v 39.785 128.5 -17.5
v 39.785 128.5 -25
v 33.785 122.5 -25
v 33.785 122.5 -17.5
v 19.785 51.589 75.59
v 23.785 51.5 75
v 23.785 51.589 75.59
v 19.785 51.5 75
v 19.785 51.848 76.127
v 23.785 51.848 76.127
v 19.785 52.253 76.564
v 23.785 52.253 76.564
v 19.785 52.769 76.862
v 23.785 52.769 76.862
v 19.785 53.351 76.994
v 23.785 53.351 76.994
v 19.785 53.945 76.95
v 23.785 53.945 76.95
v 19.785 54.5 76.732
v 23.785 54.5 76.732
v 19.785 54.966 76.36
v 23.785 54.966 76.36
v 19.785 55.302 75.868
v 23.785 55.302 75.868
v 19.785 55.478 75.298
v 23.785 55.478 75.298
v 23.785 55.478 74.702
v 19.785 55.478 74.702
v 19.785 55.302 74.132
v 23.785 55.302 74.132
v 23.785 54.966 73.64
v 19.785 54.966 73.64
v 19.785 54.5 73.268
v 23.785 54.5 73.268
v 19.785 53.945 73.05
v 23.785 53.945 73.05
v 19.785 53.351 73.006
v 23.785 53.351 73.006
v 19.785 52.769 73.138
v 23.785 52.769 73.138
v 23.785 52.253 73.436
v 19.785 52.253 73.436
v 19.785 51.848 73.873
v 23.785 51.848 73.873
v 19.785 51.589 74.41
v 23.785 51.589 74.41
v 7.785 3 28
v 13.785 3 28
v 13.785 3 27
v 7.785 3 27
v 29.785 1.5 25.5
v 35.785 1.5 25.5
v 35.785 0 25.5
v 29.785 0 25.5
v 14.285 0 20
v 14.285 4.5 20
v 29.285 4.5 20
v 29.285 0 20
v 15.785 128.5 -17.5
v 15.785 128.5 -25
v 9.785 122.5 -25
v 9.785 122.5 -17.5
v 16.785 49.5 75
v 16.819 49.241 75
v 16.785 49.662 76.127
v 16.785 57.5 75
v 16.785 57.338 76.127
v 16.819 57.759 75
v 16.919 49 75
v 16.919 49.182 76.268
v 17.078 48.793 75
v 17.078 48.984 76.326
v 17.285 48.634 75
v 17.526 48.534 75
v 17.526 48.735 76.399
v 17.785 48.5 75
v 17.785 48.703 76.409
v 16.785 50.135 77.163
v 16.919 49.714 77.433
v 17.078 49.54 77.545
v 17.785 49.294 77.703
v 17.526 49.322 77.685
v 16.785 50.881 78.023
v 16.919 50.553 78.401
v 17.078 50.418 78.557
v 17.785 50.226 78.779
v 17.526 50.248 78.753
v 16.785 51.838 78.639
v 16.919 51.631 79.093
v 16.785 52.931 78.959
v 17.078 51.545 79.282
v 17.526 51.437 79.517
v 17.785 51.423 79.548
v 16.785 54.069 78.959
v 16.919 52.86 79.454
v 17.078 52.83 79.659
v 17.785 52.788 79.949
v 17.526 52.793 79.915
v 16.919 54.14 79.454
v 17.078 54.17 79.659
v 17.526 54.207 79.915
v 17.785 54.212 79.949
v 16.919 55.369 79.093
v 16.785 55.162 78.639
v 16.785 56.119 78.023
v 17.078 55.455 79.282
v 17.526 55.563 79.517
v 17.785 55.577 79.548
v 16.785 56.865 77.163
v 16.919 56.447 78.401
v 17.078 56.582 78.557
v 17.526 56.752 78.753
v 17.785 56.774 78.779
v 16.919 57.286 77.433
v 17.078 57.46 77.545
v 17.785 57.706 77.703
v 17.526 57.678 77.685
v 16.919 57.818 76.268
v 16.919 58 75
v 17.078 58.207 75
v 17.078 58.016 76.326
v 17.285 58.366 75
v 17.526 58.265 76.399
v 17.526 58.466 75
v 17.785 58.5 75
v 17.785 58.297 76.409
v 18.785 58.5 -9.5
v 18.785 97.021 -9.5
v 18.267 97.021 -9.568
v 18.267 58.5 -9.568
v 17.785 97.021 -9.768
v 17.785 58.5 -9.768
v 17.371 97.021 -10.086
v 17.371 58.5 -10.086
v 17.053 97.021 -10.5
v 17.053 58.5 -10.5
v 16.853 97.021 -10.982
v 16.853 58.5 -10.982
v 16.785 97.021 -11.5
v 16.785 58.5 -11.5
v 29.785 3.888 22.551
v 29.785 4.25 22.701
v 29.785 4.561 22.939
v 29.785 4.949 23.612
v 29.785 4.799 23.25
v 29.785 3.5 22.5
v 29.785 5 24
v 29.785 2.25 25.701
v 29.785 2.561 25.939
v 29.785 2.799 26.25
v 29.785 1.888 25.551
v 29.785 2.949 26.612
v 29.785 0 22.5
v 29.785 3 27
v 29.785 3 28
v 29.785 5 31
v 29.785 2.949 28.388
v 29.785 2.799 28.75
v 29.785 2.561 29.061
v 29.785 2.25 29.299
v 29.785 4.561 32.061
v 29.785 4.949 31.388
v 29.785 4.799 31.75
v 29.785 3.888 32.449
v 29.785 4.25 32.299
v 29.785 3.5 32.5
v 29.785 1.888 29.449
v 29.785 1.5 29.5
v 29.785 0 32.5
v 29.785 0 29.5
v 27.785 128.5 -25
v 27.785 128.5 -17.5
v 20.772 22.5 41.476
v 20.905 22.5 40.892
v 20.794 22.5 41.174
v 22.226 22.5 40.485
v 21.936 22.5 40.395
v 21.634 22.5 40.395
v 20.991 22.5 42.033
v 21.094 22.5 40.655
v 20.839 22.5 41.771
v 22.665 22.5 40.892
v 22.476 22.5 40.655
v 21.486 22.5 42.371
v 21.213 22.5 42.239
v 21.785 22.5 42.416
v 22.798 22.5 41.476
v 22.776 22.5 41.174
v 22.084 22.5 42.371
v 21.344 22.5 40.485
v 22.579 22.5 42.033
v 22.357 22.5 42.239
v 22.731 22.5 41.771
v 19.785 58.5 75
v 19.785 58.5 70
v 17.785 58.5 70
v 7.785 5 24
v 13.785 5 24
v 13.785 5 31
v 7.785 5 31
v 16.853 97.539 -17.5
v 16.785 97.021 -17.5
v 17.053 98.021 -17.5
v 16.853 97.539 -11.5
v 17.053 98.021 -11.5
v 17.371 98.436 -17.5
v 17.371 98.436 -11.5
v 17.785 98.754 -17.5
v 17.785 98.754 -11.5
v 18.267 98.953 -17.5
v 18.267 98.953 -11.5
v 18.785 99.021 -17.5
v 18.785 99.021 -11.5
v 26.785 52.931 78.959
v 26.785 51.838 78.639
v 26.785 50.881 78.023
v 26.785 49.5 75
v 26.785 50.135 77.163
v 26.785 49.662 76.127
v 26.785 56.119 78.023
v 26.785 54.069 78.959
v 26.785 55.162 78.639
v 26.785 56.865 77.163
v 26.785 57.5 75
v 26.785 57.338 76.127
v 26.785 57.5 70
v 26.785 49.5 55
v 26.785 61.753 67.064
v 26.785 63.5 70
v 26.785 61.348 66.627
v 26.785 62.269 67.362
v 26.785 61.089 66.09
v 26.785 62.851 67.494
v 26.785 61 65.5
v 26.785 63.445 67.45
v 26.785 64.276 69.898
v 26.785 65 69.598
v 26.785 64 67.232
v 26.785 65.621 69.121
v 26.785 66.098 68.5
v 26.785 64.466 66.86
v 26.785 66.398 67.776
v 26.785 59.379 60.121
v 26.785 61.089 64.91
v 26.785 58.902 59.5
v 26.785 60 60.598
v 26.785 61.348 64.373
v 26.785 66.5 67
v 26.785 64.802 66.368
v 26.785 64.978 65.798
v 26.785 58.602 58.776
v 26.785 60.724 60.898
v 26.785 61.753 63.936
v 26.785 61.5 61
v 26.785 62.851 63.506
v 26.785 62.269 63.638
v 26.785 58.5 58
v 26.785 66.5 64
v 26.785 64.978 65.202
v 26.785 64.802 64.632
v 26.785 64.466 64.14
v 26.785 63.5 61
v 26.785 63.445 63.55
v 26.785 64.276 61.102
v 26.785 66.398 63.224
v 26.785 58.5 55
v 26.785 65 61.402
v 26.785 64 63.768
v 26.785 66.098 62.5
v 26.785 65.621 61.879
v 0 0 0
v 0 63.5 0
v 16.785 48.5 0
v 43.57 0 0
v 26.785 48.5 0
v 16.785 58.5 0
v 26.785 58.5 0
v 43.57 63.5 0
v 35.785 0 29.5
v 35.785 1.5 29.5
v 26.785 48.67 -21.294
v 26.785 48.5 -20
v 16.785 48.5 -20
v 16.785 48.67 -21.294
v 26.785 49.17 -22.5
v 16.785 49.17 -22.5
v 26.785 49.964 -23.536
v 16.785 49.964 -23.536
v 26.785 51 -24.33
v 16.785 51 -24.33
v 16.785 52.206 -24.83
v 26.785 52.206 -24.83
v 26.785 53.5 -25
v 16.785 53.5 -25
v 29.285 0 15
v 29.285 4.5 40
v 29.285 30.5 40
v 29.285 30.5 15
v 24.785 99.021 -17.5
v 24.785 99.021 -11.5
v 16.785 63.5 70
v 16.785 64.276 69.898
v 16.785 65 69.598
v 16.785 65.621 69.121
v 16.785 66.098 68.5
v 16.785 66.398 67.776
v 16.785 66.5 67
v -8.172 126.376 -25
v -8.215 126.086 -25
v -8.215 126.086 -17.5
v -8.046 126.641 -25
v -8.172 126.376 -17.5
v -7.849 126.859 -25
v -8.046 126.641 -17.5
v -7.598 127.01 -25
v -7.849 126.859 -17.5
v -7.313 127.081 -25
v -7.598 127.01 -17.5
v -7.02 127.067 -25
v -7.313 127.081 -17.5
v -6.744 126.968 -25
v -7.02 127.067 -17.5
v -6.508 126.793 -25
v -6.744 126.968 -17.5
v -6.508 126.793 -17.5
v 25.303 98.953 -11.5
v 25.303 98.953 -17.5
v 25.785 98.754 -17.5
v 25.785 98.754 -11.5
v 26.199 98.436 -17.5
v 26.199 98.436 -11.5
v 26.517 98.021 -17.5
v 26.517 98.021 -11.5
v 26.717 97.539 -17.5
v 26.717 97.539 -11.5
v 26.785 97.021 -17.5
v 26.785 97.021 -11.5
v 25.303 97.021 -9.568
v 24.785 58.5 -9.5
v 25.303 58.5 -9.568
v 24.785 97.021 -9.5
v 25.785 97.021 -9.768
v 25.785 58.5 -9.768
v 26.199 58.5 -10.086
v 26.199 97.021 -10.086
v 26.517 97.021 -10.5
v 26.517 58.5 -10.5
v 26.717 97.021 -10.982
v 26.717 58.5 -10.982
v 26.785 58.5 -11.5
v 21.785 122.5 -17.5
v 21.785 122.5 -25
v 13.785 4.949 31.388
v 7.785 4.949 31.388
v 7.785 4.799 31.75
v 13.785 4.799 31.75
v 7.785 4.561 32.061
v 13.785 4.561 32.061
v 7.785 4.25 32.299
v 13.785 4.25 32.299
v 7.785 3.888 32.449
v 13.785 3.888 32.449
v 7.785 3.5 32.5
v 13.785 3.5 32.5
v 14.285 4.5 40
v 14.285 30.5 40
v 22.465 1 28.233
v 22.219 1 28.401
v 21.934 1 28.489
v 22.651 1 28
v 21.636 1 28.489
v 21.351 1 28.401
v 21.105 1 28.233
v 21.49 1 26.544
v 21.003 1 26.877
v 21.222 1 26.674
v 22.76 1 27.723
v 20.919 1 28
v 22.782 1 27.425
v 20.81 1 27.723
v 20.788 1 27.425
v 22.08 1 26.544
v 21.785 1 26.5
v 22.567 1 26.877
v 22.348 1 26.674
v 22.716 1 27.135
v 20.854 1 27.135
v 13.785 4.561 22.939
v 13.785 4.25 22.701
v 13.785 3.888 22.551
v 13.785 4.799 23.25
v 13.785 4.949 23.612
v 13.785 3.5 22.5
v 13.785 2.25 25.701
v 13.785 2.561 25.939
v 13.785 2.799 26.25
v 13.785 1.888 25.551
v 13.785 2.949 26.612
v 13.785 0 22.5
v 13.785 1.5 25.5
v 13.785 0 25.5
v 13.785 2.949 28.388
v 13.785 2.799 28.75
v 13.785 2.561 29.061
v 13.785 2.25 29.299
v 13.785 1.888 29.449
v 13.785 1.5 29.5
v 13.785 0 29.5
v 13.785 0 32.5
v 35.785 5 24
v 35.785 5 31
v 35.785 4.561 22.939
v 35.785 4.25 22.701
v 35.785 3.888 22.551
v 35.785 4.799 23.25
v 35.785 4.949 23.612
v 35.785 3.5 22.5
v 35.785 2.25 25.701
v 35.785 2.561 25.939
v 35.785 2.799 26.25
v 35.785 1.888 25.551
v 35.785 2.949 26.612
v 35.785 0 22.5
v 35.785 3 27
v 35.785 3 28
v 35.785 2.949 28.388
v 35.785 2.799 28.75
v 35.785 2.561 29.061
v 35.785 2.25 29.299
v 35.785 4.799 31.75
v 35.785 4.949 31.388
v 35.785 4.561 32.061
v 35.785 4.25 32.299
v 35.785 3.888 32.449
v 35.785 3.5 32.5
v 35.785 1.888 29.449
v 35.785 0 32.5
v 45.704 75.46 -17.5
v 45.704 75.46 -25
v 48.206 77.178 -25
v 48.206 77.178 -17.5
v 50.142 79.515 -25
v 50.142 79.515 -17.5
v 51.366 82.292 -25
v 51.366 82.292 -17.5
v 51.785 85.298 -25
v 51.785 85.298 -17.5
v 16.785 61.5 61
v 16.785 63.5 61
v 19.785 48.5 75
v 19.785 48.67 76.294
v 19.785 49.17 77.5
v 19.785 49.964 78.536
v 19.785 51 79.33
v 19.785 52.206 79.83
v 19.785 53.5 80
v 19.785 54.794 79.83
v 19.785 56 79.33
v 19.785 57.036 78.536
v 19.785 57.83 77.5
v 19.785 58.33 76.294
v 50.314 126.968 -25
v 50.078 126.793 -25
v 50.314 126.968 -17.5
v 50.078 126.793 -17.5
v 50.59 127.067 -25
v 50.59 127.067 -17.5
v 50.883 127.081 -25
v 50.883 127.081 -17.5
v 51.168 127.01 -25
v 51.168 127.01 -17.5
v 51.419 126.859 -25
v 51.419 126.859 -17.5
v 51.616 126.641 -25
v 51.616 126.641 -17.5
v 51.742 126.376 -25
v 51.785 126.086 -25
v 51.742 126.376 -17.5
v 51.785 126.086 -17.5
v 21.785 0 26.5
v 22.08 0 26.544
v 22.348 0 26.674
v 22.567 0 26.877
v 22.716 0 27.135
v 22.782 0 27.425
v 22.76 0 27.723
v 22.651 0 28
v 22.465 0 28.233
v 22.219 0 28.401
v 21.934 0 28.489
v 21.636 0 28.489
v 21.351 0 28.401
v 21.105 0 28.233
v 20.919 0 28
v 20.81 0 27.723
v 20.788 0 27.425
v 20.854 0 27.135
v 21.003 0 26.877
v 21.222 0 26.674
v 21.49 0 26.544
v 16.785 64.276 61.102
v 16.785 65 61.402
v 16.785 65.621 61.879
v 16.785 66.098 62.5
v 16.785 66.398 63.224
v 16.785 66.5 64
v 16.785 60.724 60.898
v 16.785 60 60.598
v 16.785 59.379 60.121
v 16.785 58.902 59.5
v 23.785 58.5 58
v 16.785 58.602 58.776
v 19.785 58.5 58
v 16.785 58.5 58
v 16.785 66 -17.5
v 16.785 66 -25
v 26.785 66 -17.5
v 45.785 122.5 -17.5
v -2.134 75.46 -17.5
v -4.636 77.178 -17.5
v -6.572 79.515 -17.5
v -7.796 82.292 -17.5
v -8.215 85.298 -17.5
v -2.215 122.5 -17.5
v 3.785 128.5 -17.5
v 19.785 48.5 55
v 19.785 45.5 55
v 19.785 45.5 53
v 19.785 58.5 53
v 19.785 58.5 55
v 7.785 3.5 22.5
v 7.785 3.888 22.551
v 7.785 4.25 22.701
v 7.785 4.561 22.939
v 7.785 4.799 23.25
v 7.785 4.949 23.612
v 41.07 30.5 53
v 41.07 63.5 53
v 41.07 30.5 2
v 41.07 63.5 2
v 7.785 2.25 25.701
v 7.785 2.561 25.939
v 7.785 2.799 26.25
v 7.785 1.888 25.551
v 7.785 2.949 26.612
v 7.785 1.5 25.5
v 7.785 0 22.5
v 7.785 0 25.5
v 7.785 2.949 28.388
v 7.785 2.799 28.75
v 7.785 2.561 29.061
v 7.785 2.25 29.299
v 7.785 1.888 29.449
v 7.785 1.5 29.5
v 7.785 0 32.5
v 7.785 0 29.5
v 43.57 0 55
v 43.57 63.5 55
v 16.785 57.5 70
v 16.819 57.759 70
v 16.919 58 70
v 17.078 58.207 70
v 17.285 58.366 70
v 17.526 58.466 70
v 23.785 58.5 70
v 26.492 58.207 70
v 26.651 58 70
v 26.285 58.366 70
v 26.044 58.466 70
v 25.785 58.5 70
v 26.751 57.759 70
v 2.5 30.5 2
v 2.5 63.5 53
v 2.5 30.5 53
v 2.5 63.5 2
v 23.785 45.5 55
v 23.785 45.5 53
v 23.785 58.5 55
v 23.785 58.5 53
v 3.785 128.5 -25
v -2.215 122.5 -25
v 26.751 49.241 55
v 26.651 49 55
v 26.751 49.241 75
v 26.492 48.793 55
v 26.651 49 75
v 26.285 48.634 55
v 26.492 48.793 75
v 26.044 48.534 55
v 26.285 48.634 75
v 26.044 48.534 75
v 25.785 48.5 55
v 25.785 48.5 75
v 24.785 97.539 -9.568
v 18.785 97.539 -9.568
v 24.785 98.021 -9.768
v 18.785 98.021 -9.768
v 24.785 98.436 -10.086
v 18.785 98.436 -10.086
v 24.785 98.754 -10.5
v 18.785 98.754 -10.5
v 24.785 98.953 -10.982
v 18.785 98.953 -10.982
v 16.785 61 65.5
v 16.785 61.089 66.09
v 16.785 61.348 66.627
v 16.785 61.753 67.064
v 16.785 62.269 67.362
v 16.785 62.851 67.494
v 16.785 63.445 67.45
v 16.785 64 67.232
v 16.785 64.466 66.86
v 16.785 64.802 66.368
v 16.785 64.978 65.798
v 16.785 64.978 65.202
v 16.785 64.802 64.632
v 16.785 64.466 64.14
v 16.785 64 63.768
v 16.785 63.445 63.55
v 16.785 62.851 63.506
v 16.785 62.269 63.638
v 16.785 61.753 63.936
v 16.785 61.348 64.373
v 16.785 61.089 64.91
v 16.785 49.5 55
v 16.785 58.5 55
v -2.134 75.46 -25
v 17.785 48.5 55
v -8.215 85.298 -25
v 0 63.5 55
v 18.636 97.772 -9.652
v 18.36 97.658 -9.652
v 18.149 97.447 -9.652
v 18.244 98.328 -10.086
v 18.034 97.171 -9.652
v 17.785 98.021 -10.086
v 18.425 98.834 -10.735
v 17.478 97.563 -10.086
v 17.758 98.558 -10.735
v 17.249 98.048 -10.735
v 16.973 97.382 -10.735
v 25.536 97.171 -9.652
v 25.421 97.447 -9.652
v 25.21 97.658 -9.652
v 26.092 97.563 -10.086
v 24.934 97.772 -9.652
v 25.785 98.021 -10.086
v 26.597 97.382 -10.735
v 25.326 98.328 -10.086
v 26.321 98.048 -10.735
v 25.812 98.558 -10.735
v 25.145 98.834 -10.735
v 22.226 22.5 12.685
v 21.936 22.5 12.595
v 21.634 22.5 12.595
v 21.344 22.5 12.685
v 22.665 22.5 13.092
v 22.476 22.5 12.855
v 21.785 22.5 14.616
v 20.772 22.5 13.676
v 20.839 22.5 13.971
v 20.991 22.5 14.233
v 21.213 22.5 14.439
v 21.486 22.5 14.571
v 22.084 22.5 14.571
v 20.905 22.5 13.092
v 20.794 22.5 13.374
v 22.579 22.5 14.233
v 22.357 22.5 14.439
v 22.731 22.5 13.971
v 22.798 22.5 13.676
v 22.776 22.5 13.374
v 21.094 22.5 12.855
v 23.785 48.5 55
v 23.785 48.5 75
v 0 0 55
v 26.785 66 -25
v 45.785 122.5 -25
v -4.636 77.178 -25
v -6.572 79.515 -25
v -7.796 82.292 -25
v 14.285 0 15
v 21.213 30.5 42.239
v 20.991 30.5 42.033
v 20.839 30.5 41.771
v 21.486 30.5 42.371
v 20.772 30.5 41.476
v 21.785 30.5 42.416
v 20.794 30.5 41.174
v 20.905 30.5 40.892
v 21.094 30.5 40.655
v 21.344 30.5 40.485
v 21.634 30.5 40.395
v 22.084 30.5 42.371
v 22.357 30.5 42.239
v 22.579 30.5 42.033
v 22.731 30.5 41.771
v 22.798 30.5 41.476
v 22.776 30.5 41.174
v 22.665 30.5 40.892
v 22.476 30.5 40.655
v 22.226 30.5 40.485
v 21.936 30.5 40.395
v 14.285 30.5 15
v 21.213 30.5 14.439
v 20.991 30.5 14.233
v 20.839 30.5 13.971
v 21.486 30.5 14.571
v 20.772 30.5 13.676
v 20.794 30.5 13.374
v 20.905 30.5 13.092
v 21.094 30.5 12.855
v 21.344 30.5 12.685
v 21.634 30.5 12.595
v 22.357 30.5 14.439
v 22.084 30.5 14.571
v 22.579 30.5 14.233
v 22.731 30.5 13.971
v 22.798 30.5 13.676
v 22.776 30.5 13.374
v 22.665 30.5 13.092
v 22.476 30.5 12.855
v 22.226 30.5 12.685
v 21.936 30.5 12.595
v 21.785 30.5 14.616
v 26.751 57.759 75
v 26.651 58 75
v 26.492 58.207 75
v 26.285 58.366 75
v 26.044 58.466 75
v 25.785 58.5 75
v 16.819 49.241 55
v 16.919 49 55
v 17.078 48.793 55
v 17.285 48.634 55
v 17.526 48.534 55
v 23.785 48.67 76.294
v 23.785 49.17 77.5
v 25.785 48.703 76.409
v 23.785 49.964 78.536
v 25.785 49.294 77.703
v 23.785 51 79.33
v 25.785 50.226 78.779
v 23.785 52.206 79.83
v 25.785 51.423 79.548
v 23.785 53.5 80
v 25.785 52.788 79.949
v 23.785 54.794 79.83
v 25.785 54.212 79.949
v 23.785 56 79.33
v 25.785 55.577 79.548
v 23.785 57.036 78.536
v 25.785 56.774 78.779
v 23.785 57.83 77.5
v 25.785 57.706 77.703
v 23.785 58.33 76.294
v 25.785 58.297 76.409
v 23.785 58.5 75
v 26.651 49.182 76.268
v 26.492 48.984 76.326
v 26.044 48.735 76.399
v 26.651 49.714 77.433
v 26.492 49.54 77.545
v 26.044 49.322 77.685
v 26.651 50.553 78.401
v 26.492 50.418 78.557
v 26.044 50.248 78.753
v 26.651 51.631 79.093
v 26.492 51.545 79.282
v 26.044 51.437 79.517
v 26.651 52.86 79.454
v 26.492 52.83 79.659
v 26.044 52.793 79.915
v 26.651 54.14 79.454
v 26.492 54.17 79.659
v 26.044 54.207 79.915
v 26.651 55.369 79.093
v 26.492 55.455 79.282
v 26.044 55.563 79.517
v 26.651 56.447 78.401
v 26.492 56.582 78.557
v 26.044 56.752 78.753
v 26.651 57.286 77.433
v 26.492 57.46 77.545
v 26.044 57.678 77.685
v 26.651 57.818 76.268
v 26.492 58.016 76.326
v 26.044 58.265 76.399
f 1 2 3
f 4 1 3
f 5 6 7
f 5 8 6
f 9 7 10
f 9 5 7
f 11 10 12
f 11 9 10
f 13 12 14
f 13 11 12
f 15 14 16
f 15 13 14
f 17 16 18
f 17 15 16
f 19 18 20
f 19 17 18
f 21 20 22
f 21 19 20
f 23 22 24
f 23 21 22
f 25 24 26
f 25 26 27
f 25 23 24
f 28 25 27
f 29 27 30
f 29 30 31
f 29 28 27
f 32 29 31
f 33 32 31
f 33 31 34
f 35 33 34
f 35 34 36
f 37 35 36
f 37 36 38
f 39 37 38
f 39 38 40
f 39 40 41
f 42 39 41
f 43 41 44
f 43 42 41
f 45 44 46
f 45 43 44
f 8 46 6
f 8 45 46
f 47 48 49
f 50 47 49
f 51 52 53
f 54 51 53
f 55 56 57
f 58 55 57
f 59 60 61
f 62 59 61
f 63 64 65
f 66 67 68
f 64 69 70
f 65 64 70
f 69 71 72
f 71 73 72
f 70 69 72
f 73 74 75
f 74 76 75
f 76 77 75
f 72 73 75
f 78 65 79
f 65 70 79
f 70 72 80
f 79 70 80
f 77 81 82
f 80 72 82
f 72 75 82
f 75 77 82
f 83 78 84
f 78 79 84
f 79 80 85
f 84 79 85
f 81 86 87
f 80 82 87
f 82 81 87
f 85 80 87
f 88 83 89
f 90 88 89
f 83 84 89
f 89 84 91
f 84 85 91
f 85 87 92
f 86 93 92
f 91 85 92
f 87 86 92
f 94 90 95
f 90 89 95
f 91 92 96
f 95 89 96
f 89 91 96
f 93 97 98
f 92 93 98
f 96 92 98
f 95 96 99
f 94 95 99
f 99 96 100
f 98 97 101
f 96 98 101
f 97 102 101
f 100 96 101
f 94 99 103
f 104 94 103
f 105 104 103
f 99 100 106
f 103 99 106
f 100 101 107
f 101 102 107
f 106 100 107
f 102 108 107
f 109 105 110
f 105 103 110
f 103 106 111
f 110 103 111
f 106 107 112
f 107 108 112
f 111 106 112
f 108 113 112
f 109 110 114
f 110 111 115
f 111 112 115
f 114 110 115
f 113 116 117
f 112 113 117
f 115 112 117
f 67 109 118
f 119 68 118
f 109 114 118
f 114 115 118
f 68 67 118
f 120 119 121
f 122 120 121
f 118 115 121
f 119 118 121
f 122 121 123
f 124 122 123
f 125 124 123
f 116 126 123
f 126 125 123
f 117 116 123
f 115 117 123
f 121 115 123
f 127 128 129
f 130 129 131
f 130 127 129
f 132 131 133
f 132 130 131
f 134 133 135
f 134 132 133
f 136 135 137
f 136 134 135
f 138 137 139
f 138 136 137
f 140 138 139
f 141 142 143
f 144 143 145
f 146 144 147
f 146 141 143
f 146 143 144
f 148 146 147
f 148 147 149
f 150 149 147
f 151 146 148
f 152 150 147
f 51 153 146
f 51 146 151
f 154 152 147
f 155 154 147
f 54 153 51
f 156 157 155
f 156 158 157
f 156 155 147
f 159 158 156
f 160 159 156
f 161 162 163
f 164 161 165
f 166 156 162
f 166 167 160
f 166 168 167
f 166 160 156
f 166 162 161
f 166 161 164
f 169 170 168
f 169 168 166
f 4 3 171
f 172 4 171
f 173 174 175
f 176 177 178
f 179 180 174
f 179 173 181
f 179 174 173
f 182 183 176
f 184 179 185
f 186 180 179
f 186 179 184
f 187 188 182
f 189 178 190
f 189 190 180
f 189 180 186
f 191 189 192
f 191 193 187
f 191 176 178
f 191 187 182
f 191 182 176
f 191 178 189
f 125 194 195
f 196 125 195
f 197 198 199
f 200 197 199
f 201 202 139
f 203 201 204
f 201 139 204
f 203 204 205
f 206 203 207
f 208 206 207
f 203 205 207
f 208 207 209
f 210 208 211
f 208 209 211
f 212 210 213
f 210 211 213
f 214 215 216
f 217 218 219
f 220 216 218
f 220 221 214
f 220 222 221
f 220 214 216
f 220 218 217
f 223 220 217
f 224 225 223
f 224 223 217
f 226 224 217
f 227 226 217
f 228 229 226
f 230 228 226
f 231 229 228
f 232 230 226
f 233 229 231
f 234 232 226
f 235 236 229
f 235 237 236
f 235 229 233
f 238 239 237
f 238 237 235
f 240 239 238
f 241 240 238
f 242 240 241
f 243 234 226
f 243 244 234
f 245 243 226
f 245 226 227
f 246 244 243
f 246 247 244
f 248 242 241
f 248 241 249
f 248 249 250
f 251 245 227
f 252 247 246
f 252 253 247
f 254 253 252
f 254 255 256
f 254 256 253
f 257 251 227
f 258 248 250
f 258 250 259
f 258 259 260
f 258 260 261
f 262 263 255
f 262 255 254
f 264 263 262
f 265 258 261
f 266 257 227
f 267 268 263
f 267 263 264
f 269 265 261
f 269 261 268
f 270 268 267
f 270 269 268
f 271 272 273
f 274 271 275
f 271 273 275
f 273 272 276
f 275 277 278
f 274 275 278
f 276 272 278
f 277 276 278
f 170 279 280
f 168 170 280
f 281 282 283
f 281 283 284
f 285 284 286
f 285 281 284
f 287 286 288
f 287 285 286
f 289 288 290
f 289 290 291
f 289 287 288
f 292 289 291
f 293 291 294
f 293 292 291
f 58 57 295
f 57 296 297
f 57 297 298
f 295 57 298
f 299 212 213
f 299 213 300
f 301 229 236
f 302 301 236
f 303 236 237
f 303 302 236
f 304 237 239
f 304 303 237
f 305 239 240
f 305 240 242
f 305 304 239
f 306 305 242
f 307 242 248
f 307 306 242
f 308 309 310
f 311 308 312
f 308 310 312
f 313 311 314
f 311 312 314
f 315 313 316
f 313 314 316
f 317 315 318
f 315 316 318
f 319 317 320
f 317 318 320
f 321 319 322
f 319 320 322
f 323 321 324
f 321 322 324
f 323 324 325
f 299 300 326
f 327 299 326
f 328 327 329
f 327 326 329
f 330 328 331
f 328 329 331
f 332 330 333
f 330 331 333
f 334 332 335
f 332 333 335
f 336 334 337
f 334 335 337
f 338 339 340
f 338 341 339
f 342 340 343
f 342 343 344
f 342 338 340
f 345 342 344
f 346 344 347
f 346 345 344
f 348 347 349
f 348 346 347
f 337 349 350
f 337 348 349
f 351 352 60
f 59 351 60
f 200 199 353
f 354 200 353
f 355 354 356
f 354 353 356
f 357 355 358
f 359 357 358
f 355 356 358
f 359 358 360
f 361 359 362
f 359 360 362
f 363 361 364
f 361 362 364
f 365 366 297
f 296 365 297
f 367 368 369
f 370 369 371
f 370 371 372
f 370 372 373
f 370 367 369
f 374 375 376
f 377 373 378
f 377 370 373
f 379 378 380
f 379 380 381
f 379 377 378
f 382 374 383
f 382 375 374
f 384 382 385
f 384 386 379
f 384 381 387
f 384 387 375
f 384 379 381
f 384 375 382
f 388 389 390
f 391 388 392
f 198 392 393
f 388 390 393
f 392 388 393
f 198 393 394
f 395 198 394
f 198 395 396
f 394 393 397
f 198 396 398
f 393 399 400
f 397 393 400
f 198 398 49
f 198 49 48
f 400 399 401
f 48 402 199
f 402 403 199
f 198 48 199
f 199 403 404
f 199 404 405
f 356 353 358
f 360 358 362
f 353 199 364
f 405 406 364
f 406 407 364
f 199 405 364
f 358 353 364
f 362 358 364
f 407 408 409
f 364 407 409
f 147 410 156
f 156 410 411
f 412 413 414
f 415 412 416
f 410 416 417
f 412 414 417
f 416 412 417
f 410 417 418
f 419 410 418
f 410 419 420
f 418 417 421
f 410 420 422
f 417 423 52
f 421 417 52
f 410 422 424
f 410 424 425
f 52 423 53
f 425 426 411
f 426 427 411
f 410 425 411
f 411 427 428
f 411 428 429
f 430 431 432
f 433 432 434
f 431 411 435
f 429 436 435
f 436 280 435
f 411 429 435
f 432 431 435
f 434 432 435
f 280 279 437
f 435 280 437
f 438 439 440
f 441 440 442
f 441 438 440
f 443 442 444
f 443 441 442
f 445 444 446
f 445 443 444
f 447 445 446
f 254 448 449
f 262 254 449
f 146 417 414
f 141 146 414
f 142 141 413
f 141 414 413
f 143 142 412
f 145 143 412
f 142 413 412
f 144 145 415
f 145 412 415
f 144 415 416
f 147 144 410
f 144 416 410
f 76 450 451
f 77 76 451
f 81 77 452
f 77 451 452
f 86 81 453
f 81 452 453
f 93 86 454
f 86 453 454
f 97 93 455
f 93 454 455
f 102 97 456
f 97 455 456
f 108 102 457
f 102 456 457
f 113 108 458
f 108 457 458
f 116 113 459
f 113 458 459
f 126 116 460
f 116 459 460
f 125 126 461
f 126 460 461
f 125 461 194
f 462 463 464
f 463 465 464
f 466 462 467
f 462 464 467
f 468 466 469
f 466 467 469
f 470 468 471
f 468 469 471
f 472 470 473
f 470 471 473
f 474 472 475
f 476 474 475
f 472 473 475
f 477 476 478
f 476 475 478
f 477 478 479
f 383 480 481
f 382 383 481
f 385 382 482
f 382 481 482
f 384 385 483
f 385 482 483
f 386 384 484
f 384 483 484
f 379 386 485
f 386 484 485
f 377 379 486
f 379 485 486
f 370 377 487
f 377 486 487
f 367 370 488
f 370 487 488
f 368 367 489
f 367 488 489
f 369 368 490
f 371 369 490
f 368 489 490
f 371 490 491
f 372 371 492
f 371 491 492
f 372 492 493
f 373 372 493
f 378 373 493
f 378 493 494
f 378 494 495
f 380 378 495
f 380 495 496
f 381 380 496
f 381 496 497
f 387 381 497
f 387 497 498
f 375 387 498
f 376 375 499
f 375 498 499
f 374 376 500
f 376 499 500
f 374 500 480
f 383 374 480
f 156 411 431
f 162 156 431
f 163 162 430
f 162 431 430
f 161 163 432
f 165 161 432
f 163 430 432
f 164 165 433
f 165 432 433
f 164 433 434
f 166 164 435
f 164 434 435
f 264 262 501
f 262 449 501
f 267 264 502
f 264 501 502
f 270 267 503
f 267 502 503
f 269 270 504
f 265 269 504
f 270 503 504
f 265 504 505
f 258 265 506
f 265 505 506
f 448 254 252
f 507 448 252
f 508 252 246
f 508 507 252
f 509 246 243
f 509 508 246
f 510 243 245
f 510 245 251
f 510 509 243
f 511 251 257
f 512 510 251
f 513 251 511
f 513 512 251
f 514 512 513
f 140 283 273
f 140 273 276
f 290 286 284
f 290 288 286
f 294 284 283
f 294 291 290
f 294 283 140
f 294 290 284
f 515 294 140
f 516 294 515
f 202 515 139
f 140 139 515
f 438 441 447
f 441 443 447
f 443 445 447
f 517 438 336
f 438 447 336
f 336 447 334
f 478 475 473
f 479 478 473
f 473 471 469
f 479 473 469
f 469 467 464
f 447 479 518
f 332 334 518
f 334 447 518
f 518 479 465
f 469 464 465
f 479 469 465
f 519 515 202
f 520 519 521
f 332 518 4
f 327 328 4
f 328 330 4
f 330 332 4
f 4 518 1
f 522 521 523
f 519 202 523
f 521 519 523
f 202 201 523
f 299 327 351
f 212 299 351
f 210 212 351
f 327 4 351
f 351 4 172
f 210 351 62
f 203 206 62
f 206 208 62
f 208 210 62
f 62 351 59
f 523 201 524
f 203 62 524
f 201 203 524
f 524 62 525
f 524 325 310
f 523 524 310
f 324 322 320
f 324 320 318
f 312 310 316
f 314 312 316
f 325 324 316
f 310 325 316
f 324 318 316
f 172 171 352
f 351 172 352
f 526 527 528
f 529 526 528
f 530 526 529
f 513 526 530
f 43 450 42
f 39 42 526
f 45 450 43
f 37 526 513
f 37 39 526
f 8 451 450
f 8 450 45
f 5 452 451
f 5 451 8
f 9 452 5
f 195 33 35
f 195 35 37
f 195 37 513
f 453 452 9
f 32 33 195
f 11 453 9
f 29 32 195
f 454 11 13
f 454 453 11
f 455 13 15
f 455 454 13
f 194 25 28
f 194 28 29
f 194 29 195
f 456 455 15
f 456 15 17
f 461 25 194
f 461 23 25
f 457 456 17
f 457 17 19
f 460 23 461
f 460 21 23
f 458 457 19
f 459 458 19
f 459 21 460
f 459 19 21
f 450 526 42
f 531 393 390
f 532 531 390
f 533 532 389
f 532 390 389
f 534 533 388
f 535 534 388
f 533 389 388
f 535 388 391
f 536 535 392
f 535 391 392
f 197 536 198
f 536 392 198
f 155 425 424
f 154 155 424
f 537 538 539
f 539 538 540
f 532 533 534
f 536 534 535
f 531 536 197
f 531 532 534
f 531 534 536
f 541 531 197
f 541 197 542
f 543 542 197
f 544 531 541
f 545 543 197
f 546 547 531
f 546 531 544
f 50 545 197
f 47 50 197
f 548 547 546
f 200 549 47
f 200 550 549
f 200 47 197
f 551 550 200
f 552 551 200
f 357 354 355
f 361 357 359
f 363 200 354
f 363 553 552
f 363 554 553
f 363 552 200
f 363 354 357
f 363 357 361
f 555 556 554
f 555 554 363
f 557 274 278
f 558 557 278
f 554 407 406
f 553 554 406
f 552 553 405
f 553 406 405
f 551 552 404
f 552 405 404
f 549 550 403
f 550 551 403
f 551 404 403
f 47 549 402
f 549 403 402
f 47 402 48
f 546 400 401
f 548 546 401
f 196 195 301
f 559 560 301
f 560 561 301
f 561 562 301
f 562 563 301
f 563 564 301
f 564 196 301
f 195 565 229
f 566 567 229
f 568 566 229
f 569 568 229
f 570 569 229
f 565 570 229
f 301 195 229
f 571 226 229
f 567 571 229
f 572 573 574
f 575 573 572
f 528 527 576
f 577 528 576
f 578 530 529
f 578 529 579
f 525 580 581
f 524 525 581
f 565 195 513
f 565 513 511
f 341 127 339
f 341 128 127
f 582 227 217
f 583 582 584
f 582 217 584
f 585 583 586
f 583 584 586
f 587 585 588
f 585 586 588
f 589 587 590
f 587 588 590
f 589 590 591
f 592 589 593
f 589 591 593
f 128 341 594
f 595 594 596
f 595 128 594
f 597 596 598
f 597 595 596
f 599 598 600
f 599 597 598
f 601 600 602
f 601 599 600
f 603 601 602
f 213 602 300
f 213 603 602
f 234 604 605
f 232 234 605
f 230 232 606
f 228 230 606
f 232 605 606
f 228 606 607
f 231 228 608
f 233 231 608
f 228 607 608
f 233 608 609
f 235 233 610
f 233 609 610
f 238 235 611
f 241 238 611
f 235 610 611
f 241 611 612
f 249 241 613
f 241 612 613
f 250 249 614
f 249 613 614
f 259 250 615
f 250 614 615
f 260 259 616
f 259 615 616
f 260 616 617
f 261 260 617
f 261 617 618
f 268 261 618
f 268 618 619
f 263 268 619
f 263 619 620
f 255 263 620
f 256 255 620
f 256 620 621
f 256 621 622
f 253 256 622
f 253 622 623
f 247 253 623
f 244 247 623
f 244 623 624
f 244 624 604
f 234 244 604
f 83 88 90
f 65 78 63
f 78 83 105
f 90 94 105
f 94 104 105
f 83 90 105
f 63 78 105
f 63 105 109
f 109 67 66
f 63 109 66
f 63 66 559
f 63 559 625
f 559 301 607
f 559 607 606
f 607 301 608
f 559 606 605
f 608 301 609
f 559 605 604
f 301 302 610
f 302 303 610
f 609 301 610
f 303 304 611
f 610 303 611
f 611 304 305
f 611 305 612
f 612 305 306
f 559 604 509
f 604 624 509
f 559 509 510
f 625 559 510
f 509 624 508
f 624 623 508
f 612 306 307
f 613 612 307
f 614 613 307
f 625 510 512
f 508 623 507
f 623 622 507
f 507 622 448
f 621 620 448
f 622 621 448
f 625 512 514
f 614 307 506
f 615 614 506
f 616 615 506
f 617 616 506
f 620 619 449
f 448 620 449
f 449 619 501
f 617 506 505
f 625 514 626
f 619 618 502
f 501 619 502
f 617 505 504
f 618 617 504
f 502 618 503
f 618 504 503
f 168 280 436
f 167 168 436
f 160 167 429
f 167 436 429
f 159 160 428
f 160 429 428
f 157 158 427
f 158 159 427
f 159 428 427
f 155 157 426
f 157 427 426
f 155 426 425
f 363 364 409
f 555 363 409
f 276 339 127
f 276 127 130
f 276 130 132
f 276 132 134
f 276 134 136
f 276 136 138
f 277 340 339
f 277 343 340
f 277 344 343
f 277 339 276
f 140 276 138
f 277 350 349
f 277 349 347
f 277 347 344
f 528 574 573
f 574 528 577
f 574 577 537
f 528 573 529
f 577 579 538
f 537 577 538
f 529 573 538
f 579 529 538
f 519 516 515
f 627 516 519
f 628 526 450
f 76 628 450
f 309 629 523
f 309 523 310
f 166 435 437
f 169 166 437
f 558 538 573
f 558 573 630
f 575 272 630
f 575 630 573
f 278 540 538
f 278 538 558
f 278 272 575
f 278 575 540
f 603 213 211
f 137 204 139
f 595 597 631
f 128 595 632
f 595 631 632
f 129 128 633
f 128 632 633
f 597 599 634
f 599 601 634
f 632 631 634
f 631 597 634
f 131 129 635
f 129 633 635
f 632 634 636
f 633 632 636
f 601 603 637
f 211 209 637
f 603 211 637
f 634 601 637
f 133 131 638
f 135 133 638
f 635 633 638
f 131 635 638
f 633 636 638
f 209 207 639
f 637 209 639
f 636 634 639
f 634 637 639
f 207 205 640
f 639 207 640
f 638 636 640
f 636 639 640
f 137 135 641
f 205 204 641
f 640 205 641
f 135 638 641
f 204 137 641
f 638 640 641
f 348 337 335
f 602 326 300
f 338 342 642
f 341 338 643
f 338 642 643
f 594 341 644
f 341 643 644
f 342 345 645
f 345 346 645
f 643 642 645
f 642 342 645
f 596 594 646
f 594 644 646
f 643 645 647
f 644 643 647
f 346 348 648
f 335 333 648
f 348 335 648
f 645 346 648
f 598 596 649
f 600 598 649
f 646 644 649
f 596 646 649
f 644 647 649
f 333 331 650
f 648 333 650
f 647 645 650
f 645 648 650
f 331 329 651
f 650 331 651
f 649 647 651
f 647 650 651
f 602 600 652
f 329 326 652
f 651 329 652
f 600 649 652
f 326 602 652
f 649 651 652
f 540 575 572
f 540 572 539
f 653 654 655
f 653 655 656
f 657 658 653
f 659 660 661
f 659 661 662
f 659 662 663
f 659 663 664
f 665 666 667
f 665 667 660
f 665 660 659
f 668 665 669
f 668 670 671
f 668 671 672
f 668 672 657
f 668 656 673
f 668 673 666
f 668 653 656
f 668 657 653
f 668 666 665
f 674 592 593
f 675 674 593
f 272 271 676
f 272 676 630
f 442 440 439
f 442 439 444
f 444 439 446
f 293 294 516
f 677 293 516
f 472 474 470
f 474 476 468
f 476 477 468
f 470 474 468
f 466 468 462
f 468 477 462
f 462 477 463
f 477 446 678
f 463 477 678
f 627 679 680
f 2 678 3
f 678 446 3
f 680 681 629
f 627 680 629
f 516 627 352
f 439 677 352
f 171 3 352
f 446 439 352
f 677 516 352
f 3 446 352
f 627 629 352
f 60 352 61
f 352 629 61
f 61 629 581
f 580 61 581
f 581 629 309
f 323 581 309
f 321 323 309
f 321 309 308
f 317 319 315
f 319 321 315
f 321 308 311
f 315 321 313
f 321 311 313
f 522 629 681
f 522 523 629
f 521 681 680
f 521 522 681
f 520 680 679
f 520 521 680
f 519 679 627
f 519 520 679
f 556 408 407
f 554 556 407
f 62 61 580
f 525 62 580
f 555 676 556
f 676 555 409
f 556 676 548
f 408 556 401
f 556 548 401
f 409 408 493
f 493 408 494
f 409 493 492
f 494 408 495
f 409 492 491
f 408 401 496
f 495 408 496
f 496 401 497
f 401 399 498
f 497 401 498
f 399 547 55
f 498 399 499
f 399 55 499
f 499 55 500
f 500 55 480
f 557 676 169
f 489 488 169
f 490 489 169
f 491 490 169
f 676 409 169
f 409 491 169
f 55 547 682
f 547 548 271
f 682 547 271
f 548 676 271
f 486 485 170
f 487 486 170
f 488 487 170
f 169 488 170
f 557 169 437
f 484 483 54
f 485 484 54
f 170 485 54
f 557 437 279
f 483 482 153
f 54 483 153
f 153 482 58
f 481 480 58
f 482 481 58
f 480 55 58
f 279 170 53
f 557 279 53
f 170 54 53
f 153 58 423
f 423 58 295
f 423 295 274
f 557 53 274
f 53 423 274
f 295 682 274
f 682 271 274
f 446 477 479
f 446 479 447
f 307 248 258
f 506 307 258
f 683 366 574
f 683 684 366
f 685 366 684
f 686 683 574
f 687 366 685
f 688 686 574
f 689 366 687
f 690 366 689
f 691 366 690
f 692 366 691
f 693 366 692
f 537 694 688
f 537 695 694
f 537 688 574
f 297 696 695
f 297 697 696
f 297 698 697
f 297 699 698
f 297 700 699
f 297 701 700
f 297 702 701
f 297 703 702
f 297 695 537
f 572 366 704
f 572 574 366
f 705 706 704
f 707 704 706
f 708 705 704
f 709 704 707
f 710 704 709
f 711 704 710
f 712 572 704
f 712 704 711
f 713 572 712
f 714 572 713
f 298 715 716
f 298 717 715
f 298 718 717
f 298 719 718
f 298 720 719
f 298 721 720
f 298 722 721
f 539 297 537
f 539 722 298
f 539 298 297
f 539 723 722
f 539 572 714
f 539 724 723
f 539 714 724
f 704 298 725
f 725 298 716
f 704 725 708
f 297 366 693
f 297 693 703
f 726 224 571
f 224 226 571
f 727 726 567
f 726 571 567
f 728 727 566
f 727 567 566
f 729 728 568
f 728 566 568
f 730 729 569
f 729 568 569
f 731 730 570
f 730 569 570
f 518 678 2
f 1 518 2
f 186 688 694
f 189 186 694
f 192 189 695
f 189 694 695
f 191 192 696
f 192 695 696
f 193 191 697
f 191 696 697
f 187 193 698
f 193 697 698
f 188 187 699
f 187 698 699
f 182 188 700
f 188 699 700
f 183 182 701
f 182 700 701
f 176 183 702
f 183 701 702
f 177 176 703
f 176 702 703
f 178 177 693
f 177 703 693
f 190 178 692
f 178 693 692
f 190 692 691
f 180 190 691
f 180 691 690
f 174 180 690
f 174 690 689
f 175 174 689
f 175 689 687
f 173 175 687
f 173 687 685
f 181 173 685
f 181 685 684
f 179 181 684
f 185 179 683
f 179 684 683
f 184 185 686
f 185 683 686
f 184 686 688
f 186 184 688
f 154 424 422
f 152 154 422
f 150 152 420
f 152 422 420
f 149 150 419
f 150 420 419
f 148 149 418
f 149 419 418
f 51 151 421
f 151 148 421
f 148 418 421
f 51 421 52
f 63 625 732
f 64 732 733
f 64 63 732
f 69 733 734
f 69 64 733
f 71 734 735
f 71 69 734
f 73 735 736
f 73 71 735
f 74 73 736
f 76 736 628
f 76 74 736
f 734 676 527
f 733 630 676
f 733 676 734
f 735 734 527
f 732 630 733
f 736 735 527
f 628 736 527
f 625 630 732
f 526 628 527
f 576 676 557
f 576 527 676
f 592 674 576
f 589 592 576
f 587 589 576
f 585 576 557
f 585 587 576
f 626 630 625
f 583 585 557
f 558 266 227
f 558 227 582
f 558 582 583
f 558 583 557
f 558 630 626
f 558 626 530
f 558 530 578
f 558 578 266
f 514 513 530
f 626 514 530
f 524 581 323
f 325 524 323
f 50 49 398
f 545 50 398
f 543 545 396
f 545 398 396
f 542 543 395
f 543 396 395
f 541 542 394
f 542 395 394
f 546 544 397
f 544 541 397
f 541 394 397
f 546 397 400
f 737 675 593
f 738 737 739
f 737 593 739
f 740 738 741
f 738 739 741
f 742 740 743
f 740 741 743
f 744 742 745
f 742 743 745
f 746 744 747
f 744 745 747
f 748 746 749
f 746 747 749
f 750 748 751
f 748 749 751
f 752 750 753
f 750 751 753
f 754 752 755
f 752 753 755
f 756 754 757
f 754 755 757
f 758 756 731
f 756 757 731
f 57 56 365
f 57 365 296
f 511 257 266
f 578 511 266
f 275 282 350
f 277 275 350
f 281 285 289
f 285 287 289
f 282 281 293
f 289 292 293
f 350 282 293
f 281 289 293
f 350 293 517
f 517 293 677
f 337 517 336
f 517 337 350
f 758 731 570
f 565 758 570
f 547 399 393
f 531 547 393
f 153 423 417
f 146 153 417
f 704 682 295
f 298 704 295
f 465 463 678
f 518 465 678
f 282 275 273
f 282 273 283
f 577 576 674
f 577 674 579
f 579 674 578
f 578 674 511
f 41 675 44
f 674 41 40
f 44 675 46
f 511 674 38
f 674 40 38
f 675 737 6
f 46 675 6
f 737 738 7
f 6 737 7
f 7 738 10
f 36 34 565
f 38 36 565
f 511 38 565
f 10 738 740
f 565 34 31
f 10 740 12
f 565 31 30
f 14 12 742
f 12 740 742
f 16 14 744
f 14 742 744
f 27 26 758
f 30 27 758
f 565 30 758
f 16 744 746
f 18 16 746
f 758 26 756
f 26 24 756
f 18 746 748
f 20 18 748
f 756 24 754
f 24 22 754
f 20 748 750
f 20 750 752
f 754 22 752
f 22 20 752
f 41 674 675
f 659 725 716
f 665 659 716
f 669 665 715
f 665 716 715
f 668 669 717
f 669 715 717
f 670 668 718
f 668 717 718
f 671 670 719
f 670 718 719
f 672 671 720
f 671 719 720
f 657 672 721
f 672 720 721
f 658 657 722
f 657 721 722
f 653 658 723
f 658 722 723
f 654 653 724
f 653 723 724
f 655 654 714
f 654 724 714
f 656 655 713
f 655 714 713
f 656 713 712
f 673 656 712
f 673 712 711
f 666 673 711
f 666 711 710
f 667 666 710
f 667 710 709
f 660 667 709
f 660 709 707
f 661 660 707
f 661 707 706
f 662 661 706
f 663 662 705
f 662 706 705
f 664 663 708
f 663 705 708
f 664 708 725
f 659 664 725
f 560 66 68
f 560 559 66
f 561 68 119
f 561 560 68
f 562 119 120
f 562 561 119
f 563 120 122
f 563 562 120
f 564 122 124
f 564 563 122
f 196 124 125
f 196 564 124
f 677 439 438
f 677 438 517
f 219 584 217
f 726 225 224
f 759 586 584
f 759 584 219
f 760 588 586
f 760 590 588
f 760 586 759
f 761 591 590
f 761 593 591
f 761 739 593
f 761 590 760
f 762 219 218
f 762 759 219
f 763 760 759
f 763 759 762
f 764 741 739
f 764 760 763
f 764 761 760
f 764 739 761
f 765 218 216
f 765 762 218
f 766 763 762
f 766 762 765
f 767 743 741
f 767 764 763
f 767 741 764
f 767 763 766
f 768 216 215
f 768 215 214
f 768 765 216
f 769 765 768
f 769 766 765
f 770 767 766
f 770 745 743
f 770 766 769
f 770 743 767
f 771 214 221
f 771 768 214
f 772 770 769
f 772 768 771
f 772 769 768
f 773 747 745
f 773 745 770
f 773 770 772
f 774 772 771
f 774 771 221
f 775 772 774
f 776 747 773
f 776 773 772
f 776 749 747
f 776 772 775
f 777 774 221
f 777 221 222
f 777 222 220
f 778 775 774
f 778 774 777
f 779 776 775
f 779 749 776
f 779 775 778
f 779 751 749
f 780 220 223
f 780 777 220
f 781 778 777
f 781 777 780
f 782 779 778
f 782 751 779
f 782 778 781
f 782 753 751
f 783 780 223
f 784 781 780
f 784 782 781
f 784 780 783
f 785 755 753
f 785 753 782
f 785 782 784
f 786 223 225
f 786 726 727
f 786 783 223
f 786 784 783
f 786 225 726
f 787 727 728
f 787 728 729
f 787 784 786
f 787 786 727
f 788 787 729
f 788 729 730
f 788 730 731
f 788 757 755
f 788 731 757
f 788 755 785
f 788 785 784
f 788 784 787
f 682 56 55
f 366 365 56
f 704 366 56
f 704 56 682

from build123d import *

# Parameters (mm, degrees)
SKETCH1_W           = 43.57
SKETCH1_H           = 63.5
BOSS_EXTRUDE1_DEPTH = 55
CUT_EXTRUDE2_DEPTH  = 95.634004988
SKETCH4_W           = 43.57
SKETCH4_H           = 55
SKETCH4_W_2         = 6
SKETCH4_H_2         = 15
BOSS_EXTRUDE2_DEPTH = 9
SKETCH5_R           = 1
CUT_EXTRUDE3_DEPTH  = 1
BOSS_EXTRUDE3_START = -26.785
BOSS_EXTRUDE3_DEPTH = 10
SKETCH7_R           = 2
CUT_EXTRUDE4_DEPTH  = 2
SKETCH13_W          = 9
SKETCH13_H          = 8
BOSS_EXTRUDE6_DEPTH = 10
FILLET12_R          = 3
FILLET2_R           = 1
BOSS_EXTRUDE4_DEPTH = 10
BOSS_EXTRUDE5_DEPTH = 7.5
CUT_EXTRUDE11_DEPTH = 174.835946297
LPATTERN1_COUNT     = 5
LPATTERN1_PITCH     = 12
FILLET9_R           = 1
FILLET11_R          = 11
SKETCH14_R          = 2
CUT_EXTRUDE12_DEPTH = 156.361674811
SKETCH15_W          = 15
SKETCH15_H          = 33
CUT_EXTRUDE13_DEPTH = 33
SKETCH16_W          = 15
SKETCH16_H          = 25
CUT_EXTRUDE14_DEPTH = 26
SKETCH18_R          = 1.016
CUT_EXTRUDE15_DEPTH = 8
SKETCH19_W          = 15
SKETCH19_H          = 5
CUT_EXTRUDE16_DEPTH = 25
SKETCH20_W          = 38.57
SKETCH20_H          = 51
CUT_EXTRUDE17_DEPTH = 33
SKETCH21_W          = 4
SKETCH21_H          = 13
CUT_EXTRUDE18_DEPTH = 27
SKETCH22_W          = 10
SKETCH22_H          = 40.521468164
BOSS_EXTRUDE7_DEPTH = 8
FILLET13_R          = 2
FILLET14_R          = 2


with BuildPart() as part:
    # Sketch1 → Boss-Extrude1 (new body)
    with BuildSketch(Plane.XY):
        with Locations((21.785, 31.75)):
            Rectangle(SKETCH1_W, SKETCH1_H)
    extrude(amount=BOSS_EXTRUDE1_DEPTH)

    # Sketch3 → Cut-Extrude2 (cut, through all)
    with BuildSketch(Plane(origin=(43.57, 0, 0), x_dir=(0, 0, -1), z_dir=(1, 0, 0))):
        with BuildLine():
            Line((-29.5, 0), (-29.5, 1.5))
            ThreePointArc((-29.5, 1.5), (-29.060660172, 2.560660172), (-28, 3))
            Line((-28, 3), (-27, 3))
            ThreePointArc((-27, 3), (-25.939339828, 2.560660172), (-25.5, 1.5))
            Line((-25.5, 1.5), (-25.5, 0))
            Line((-25.5, 0), (-22.5, 0))
            Line((-22.5, 0), (-22.5, 3.5))
            ThreePointArc((-22.5, 3.5), (-22.939339828, 4.560660172), (-24, 5))
            Line((-24, 5), (-31, 5))
            ThreePointArc((-31, 5), (-32.060660172, 4.560660172), (-32.5, 3.5))
            Line((-32.5, 3.5), (-32.5, 0))
            Line((-32.5, 0), (-29.5, 0))
        make_face()
    extrude(amount=-CUT_EXTRUDE2_DEPTH, mode=Mode.SUBTRACT)


with BuildPart() as cut_extrude2_piece_1:
    # of the separate pieces the step leaves, piece 1, a body of its own (cut_extrude2_pieces)
    add(part.part.solids().sort_by_distance((0, 0, 0))[0])



with BuildPart() as cut_extrude2_piece_2:
    # of the separate pieces the step leaves, piece 2, a body of its own (cut_extrude2_pieces)
    add(part.part.solids().sort_by_distance((43.57, 0, 25.5))[0])


with BuildPart() as cut_extrude2_piece_1_1:
    add(cut_extrude2_piece_1.part)

    add(cut_extrude2_piece_2.part)  # Boss-Extrude2 merges Cut-Extrude2 piece 2
    # Sketch4 → Boss-Extrude2 (add)
    with BuildSketch(Plane.XZ):
        with Locations((21.785, 27.5)):
            Rectangle(SKETCH4_W, SKETCH4_H)
        with Locations((10.785, 27.5)):
            Rectangle(SKETCH4_W_2, SKETCH4_H_2, mode=Mode.SUBTRACT)
        with Locations((32.785, 27.5)):
            Rectangle(SKETCH4_W_2, SKETCH4_H_2, mode=Mode.SUBTRACT)
    extrude(amount=-BOSS_EXTRUDE2_DEPTH)

    # Sketch5 → Cut-Extrude3 (cut)
    with BuildSketch(Plane(origin=(0, 0, 0), x_dir=(-1, 0, 0), z_dir=(0, -1, 0))):
        with Locations(Location((-21.785, -27.5, 0), (0, 0, 90))):
            Circle(SKETCH5_R)
    extrude(amount=-CUT_EXTRUDE3_DEPTH, mode=Mode.SUBTRACT)

    # Sketch6 → Boss-Extrude3 (add)
    with BuildSketch(Plane.ZY.offset(BOSS_EXTRUDE3_START)):
        with BuildLine():
            Line((55, 48.5), (75, 48.5))
            ThreePointArc((75, 48.5), (80, 53.5), (75, 58.5))
            Line((75, 58.5), (55, 58.5))
            ThreePointArc((55, 58.5), (50, 53.5), (55, 48.5))
        make_face()
    boss_extrude3 = extrude(amount=BOSS_EXTRUDE3_DEPTH)

    # Mirror1: Boss-Extrude3 across plane
    add(boss_extrude3.mirror(Plane(origin=(0, 0, 27.5), x_dir=(1, 0, 0), z_dir=(0, 0, -1))))

    # Sketch7 → Cut-Extrude4 (cut, symmetric)
    # profile 1 of 3: a face of its own
    with BuildSketch(Plane.ZY.offset(-21.785)):
        with BuildLine():
            ThreePointArc((75, 58.5), (71.464466094, 57.035533906), (70, 53.5))
            ThreePointArc((70, 53.5), (71.464466094, 49.964466094), (75, 48.5))
            ThreePointArc((75, 48.5), (78.535533906, 49.964466094), (80, 53.5))
            ThreePointArc((80, 53.5), (78.535533906, 57.035533906), (75, 58.5))
        make_face()
        with Locations(Location((75, 53.5, 0), (0, 0, 270))):
            Circle(SKETCH7_R, mode=Mode.SUBTRACT)
    # profile 2 of 3: a face of its own
    with BuildSketch(Plane.ZY.offset(-21.785)):
        with BuildLine():
            Line((70, 58.5), (70, 53.5))
            ThreePointArc((70, 53.5), (71.464466094, 57.035533906), (75, 58.5))
            Line((75, 58.5), (70, 58.5))
        make_face()
    # profile 3 of 3: a face of its own
    with BuildSketch(Plane.ZY.offset(-21.785)):
        with BuildLine():
            ThreePointArc((75, 48.5), (71.464466094, 49.964466094), (70, 53.5))
            Line((70, 53.5), (70, 48.5))
            Line((70, 48.5), (75, 48.5))
        make_face()
    extrude(amount=CUT_EXTRUDE4_DEPTH, both=True, mode=Mode.SUBTRACT)

    # Sketch13 → Boss-Extrude6 (add)
    with BuildSketch(Plane(origin=(26.785, 0, 0), x_dir=(0, 0, -1), z_dir=(1, 0, 0))):
        with Locations((-65.5, 62.5)):
            Rectangle(SKETCH13_W, SKETCH13_H)
    extrude(amount=-BOSS_EXTRUDE6_DEPTH)

    # Fillet12
    fillet12_edges = [cut_extrude2_piece_1_1.edges().sort_by_distance(p)[0] for p in [
        (21.785, 66.5, 61),
        (21.785, 66.5, 70),
        (21.785, 58.5, 61),
    ]]
    fillet(fillet12_edges, radius=FILLET12_R)

    # Fillet2
    fillet2_edges = [cut_extrude2_piece_1_1.edges().sort_by_distance(p)[0] for p in [
        (16.785, 48.5, 65),
        (16.785, 53.5, 80),
        (16.785, 58.5, 72.5),
        (26.785, 48.5, 65),
        (26.785, 53.5, 80),
        (26.785, 58.5, 72.5),
    ]]
    fillet(fillet2_edges, radius=FILLET2_R)

    # Sketch10 → Boss-Extrude4 (add)
    with BuildSketch(Plane.ZY.offset(-16.785)):
        with BuildLine():
            Line((-25, 53.5), (-25, 78.5))
            Line((-25, 78.5), (-17.5, 78.5))
            Line((-17.5, 78.5), (-17.5, 58.5))
            Line((-17.5, 58.5), (-20, 58.5))
            ThreePointArc((-20, 58.5), (-23.535533906, 57.035533906), (-25, 53.5))
        make_face()
    extrude(amount=-BOSS_EXTRUDE4_DEPTH)

    # Sketch11 → Boss-Extrude5 (add)
    with BuildSketch(Plane(origin=(0, 0, -25), x_dir=(-1, 0, 0), z_dir=(0, 0, -1))):
        Polygon((-21.785, 63.5), (8.215, 78.5), (8.215, 128.5), (-51.785, 128.5), (-51.785, 78.5), align=None)
    extrude(amount=-BOSS_EXTRUDE5_DEPTH)

    # Sketch12 → Cut-Extrude11 (cut, through all)
    with BuildSketch(Plane(origin=(0, 0, -25), x_dir=(-1, 0, 0), z_dir=(0, 0, -1))):
        Polygon((-51.785, 128.5), (-45.785, 122.5), (-39.785, 128.5), align=None)
    cut_extrude11 = extrude(amount=-CUT_EXTRUDE11_DEPTH, mode=Mode.SUBTRACT)

    # LPattern1: Cut-Extrude11 ×5
    with Locations(*[(-i * LPATTERN1_PITCH, 0, 0) for i in range(1, LPATTERN1_COUNT)]):
        add(cut_extrude11, mode=Mode.SUBTRACT)

    # Fillet9
    fillet9_edges = [cut_extrude2_piece_1_1.edges().sort_by_distance(p)[0] for p in [
        (-8.215, 128.5, -21.25),
        (51.785, 128.5, -21.25),
    ]]
    fillet(fillet9_edges, radius=FILLET9_R)

    # Fillet11
    fillet11_edges = [cut_extrude2_piece_1_1.edges().sort_by_distance(p)[0] for p in [
        (-8.215, 78.5, -21.25),
        (51.785, 78.5, -21.25),
    ]]
    fillet(fillet11_edges, radius=FILLET11_R)

    # Sketch14 → Cut-Extrude12 (cut, through all)
    with BuildSketch(Plane.ZY.offset(-16.785)):
        with Locations(Location((65.5, 63, 0), (0, 0, 270))):
            Circle(SKETCH14_R)
    extrude(amount=-CUT_EXTRUDE12_DEPTH, mode=Mode.SUBTRACT)

    # Sketch15 → Cut-Extrude13 (cut)
    with BuildSketch(Plane(origin=(0, 63.5, 0), x_dir=(1, 0, 0), z_dir=(0, 1, 0))):
        with Locations((21.785, -27.5)):
            Rectangle(SKETCH15_W, SKETCH15_H)
    extrude(amount=-CUT_EXTRUDE13_DEPTH, mode=Mode.SUBTRACT)

    # Sketch16 → Cut-Extrude14 (cut)
    with BuildSketch(Plane(origin=(0, 30.5, 0), x_dir=(1, 0, 0), z_dir=(0, 1, 0))):
        with Locations((21.785, -27.5)):
            Rectangle(SKETCH16_W, SKETCH16_H)
    extrude(amount=-CUT_EXTRUDE14_DEPTH, mode=Mode.SUBTRACT)

    # Sketch18 → Cut-Extrude15 (cut)
    with BuildSketch(Plane(origin=(0, 30.5, 0), x_dir=(1, 0, 0), z_dir=(0, 1, 0))):
        with Locations(Location((21.785, -13.6, 0), (0, 0, 270))):
            Circle(SKETCH18_R)
        with Locations(Location((21.785, -41.4, 0), (0, 0, 270))):
            Circle(SKETCH18_R)
    extrude(amount=-CUT_EXTRUDE15_DEPTH, mode=Mode.SUBTRACT)

    # Sketch19 → Cut-Extrude16 (cut)
    with BuildSketch(Plane(origin=(0, 4.5, 0), x_dir=(1, 0, 0), z_dir=(0, 1, 0))):
        with Locations((21.785, -17.5)):
            Rectangle(SKETCH19_W, SKETCH19_H)
    extrude(amount=-CUT_EXTRUDE16_DEPTH, mode=Mode.SUBTRACT)

    # Sketch20 → Cut-Extrude17 (cut)
    with BuildSketch(Plane(origin=(0, 63.5, 0), x_dir=(1, 0, 0), z_dir=(0, 1, 0))):
        with Locations((21.785, -27.5)):
            Rectangle(SKETCH20_W, SKETCH20_H)
    extrude(amount=-CUT_EXTRUDE17_DEPTH, mode=Mode.SUBTRACT)

    # Sketch21 → Cut-Extrude18 (cut)
    with BuildSketch(Plane.XY.offset(70)):
        with Locations((21.785, 52)):
            Rectangle(SKETCH21_W, SKETCH21_H)
    extrude(amount=-CUT_EXTRUDE18_DEPTH, mode=Mode.SUBTRACT)

    # Sketch22 → Boss-Extrude7 (add)
    with BuildSketch(Plane.XY.offset(-17.5)):
        with Locations((21.785, 78.760734082)):
            Rectangle(SKETCH22_W, SKETCH22_H)
    extrude(amount=BOSS_EXTRUDE7_DEPTH)

    # Fillet13
    fillet13_edges = [cut_extrude2_piece_1_1.edges().sort_by_distance(p)[0] for p in [
        (16.785, 99.021468164, -13.5),
        (26.785, 99.021468164, -13.5),
    ]]
    fillet(fillet13_edges, radius=FILLET13_R)

    # Fillet14
    fillet14_edges = [cut_extrude2_piece_1_1.edges().sort_by_distance(p)[0] for p in [
        (26.785, 77.760734082, -9.5),
        (21.785, 99.021468164, -9.5),
        (16.785, 77.760734082, -9.5),
        (17.370786438, 98.435681727, -9.5),
        (26.199213562, 98.435681727, -9.5),
    ]]
    fillet(fillet14_edges, radius=FILLET14_R)


solid = cut_extrude2_piece_1_1.part
